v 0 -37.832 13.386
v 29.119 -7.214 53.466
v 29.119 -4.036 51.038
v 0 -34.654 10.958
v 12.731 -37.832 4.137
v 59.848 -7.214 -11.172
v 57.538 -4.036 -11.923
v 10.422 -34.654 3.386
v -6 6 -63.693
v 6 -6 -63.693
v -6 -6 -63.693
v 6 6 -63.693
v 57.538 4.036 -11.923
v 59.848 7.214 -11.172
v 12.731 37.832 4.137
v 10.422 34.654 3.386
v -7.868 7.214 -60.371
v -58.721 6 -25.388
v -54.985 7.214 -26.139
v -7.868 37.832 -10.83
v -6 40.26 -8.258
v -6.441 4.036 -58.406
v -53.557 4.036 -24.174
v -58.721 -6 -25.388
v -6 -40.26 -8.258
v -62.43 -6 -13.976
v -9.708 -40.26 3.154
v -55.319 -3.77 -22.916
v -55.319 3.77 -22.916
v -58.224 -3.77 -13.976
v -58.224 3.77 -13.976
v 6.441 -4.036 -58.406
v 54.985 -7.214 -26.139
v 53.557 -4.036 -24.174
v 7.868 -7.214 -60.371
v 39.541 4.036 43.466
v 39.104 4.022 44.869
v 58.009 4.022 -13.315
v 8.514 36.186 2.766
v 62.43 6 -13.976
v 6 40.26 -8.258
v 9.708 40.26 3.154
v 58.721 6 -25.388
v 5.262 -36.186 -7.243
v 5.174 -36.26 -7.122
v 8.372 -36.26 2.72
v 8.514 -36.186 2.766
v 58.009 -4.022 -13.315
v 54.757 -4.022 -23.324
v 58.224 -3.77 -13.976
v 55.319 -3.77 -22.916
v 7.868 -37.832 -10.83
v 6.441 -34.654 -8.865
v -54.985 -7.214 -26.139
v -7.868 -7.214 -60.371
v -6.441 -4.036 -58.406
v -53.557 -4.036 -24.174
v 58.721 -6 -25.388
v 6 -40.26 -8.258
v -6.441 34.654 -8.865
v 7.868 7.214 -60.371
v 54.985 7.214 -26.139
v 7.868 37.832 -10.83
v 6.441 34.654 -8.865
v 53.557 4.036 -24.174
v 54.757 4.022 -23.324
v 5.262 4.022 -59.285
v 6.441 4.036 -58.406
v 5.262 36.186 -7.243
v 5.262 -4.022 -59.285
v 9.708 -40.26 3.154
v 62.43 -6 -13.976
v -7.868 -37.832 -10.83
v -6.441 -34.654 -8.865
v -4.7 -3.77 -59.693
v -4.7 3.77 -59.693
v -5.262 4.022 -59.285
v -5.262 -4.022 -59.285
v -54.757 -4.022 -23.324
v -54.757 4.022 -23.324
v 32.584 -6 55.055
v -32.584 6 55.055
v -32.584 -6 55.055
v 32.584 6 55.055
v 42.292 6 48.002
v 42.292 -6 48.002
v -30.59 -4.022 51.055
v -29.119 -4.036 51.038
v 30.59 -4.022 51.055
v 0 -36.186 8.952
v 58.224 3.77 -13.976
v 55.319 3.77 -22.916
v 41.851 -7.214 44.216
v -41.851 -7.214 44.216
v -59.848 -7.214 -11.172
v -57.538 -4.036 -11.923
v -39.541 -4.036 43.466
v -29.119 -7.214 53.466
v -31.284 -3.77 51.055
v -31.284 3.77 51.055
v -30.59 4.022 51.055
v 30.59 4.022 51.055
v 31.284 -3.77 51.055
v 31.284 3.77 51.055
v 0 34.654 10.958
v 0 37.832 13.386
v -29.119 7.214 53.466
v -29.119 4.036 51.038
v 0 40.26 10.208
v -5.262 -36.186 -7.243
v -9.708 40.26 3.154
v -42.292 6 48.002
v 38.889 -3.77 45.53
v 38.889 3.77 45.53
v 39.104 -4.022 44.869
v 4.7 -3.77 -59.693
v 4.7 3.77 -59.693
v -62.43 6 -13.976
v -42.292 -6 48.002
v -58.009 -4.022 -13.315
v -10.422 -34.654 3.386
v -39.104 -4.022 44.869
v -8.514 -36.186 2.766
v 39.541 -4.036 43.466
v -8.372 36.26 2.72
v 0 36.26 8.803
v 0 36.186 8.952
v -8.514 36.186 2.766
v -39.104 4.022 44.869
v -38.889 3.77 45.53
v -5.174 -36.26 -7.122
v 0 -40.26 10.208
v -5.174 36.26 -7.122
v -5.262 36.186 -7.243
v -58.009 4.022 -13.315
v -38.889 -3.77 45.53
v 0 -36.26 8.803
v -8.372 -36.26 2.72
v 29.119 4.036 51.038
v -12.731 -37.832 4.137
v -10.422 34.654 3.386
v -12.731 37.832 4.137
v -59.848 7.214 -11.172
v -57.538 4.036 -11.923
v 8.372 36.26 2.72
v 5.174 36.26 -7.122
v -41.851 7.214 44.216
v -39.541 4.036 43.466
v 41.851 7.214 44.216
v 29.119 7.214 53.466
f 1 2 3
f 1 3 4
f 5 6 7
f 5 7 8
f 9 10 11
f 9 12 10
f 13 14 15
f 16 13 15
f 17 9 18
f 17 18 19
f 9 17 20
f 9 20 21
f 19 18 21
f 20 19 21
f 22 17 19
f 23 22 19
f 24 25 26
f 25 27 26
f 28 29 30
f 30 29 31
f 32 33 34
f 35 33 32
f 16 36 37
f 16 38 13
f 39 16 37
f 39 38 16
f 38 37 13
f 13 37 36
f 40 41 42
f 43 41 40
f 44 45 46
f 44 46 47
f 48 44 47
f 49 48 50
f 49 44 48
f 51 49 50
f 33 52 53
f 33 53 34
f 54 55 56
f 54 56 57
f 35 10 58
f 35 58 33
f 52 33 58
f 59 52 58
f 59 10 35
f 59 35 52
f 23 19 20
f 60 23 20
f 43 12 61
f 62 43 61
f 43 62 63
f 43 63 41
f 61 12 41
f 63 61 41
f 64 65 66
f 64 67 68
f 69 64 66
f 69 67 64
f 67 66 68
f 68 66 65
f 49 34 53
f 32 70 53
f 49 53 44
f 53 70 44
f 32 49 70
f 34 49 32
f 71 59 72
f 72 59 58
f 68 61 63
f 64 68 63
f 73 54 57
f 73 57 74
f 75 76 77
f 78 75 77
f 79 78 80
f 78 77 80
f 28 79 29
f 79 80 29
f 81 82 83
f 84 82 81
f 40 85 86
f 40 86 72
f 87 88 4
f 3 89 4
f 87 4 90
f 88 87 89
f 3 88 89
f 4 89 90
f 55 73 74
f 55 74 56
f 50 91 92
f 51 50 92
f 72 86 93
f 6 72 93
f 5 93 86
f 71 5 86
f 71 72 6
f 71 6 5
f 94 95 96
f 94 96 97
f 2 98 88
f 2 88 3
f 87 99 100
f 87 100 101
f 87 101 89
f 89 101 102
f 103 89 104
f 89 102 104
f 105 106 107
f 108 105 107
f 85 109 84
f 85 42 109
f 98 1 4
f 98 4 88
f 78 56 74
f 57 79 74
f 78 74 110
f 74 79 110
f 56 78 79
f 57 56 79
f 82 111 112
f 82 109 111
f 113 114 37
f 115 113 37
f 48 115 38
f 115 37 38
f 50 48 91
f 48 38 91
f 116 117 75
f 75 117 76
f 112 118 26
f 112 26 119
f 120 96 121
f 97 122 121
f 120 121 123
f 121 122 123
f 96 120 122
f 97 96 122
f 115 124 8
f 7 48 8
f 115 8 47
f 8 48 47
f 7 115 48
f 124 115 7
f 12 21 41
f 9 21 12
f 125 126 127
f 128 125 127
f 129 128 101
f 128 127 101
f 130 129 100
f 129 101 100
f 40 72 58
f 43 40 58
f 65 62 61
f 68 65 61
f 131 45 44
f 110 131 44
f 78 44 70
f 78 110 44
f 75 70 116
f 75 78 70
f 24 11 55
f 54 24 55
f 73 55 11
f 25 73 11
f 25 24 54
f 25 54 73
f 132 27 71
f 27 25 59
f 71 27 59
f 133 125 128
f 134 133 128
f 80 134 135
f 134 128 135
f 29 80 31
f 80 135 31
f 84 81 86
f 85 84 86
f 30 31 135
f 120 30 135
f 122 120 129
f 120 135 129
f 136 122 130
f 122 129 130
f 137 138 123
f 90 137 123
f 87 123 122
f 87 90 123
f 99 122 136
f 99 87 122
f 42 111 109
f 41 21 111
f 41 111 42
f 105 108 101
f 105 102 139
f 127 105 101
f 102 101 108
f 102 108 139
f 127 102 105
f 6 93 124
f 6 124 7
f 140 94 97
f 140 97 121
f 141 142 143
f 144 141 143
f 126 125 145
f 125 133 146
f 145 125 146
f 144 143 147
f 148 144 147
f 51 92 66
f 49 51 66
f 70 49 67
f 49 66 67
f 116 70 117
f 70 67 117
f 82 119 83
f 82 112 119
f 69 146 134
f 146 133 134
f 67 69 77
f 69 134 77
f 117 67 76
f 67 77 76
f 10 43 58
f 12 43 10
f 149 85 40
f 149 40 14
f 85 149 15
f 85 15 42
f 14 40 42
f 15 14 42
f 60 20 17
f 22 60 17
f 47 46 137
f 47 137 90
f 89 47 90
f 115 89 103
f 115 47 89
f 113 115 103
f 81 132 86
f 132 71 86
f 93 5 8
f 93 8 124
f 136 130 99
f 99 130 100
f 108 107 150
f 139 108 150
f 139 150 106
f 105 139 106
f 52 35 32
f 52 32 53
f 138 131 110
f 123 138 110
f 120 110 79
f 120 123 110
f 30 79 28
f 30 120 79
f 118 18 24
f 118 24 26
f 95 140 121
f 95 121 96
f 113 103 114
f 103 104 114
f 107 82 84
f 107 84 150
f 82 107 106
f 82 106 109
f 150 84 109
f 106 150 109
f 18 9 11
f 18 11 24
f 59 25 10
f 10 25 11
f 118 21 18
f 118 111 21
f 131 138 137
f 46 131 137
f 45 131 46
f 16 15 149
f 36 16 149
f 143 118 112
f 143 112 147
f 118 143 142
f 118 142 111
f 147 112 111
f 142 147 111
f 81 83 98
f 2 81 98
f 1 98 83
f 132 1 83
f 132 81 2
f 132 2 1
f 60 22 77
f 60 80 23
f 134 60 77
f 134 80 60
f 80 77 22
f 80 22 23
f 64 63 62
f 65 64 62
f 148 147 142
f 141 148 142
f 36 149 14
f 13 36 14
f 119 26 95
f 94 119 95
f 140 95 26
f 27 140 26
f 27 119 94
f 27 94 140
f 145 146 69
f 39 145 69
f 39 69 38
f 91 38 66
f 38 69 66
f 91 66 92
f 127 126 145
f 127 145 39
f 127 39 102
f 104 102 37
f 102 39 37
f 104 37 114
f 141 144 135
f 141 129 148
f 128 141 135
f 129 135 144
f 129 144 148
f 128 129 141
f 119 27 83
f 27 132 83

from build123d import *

# Parameters (mm, degrees)
EXTRUDE_1_DEPTH          = 6
EXTRUDE_2_DEPTH          = 50
EXTRUDE_3_REACH          = 116.36
EXTRUDE_4_REACH          = 109.318
PATTERN_CIRCULAR_1_COUNT = 5
CUT_EXTRUDE_START        = 34.260416
CUT_EXTRUDE_2_DEPTH      = 15.739584
SHELL_2_T                = 4
CUT_EXTRUDE_3_DEPTH      = 4
PATTERN_CIRCULAR_2_COUNT = 5
MIRROR_2_COPY_1_DEPTH    = 4
MIRROR_2_COPY_2_DEPTH    = 4
MIRROR_2_COPY_3_DEPTH    = 4
MIRROR_2_COPY_4_DEPTH    = 4


with BuildPart() as part:
    # 草图1 → 凸台-拉伸1 (new body)
    with BuildSketch(Plane(origin=(0, 0, 0), x_dir=(1, 0, 0), z_dir=(0, 1, 0))):
        Polygon((6, 63.6928095), (-6, 63.6928095), (-58.72135955, 25.388499653), (-62.429563482, 13.975821457), (-42.291796068, -48.001853791), (-32.583592135, -55.055276819), (32.583592135, -55.055276819), (42.291796068, -48.001853791), (62.429563482, 13.975821457), (58.72135955, 25.388499653), align=None)
    extrude(amount=EXTRUDE_1_DEPTH)

    # 草图2 → 凸台-拉伸2 (add)
    with BuildSketch(Plane(origin=(0, 6, 0), x_dir=(1, 0, 0), z_dir=(0, 1, 0))):
        Polygon((-6, 8.258291523), (-9.708203932, -3.154386673), (0, -10.2078097), (9.708203932, -3.154386673), (6, 8.258291523), align=None)
    extrude(amount=EXTRUDE_2_DEPTH)

    # 草图3 → 凸台-拉伸3 (add, up to next)
    with BuildSketch(Plane(origin=(22.048945114, 30.347769421, 7.164136549), x_dir=(-0.8164965809277247, 0.5619055660577269, 0.1326479105251229), z_dir=(-0.5773502691896276, -0.7946544722917646, -0.18759247408508062)), mode=Mode.PRIVATE) as extrude_3_sk1:
        Polygon((-49.45595525, 14.980471634), (-24.792327887, -45.339238172), (15.114259472, 6.179944577), align=None)
    extrude_3_tool1 = extrude(extrude_3_sk1.sketch, amount=EXTRUDE_3_REACH, mode=Mode.PRIVATE) - part.part
    extrude_3 = extrude_3_tool1.solids().sort_by_distance((38.143188, 17.420139, 12.393473))[0]
    add(extrude_3)

    # 草图5 → 凸台-拉伸4 (add, up to next)
    with BuildSketch(Plane(origin=(19.294598211, 32.825931131, -6.26919499), x_dir=(0.8660254037844378, -0.49112347318842436, 0.09379623704254153), z_dir=(0.5000000000000017, 0.8506508083520388, -0.16245984811645525)), mode=Mode.PRIVATE) as extrude_4_sk1:
        Polygon((-11.069414635, -10.650937771), (49.807967622, 12.602153105), (45.526102544, 23.812221413), (-15.351279712, 0.559130537), align=None)
    extrude_4_tool1 = extrude(extrude_4_sk1.sketch, amount=-EXTRUDE_4_REACH, mode=Mode.PRIVATE) - part.part
    extrude_4 = extrude_4_tool1.solids().sort_by_distance((34.214782, 23.130208, -11.117056))[0]
    add(extrude_4)

    # 阵列(圆周)1: 凸台-拉伸3, 凸台-拉伸4 ×5 about axis
    pattern_circular_1_axis = Axis((0, 0, 0), (0, 1, 0))
    add([extrude_3.rotate(pattern_circular_1_axis, i * 360 / PATTERN_CIRCULAR_1_COUNT) for i in range(1, PATTERN_CIRCULAR_1_COUNT)])
    add([extrude_4.rotate(pattern_circular_1_axis, i * 360 / PATTERN_CIRCULAR_1_COUNT) for i in range(1, PATTERN_CIRCULAR_1_COUNT)])

    # 草图2<2> → 切除-拉伸2 (cut)
    with BuildSketch(Plane(origin=(0, 6, 0), x_dir=(1, 0, 0), z_dir=(0, 1, 0)).offset(CUT_EXTRUDE_START)):
        Polygon((-6, 8.258291523), (-9.708203932, -3.154386673), (0, -10.2078097), (9.708203932, -3.154386673), (6, 8.258291523), align=None)
    extrude(amount=CUT_EXTRUDE_2_DEPTH, mode=Mode.SUBTRACT)

    # 镜向1: part across plane


with BuildPart() as part_1:
    add(part.part)
    add(part.part.mirror(Plane.ZX))

    # 抽壳2 (no face opened: a closed hollow body)
    add(offset(amount=-SHELL_2_T, mode=Mode.PRIVATE), mode=Mode.SUBTRACT)

    # 草图6 → 切除-拉伸3 (cut)
    with BuildSketch(Plane(origin=(22.048945114, 30.347769421, 7.164136549), x_dir=(0.8164965809277248, -0.5619055660577268, -0.13264791052512276), z_dir=(0.5773502691896275, 0.7946544722917647, 0.18759247408508056))):
        Polygon((-11.411800298, 4.66607666), (24.252146374, -41.375880513), (46.29367759, 12.530981891), align=None)
    cut_extrude_3 = extrude(amount=-CUT_EXTRUDE_3_DEPTH, mode=Mode.SUBTRACT)

    # 阵列(圆周)2: 切除-拉伸3 ×5 about axis
    pattern_circular_2_axis = Axis((0, 0, 0), (0, 1, 0))
    for i in range(1, PATTERN_CIRCULAR_2_COUNT):
        add(cut_extrude_3.rotate(pattern_circular_2_axis, i * 360 / PATTERN_CIRCULAR_2_COUNT), mode=Mode.SUBTRACT)

    # 镜向2: 切除-拉伸3 across plane
    add(cut_extrude_3.mirror(Plane.ZX), mode=Mode.SUBTRACT)

    # 镜向2 copy 1 sketch → 镜向2 copy 1 (cut)
    with BuildSketch(Plane(origin=(13.626997497, -30.347769421, -18.755952985), x_dir=(0.12615565967785208, 0.5619055660577268, -0.8175248524446163), z_dir=(0.3568220897730911, -0.7946544722917647, -0.4911234731884244))):
        Polygon((-11.411800298, -4.66607666), (24.252146374, 41.375880513), (46.29367759, -12.530981891), align=None)
    extrude(amount=-MIRROR_2_COPY_1_DEPTH, mode=Mode.SUBTRACT)

    # 镜向2 copy 2 sketch → 镜向2 copy 2 (cut)
    with BuildSketch(Plane(origin=(-13.626997497, -30.347769421, -18.755952985), x_dir=(-0.7385280953736475, 0.5619055660577268, -0.37261023493339274), z_dir=(-0.3568220897730909, -0.7946544722917647, -0.49112347318842464))):
        Polygon((-11.411800298, -4.66607666), (24.252146374, 41.375880513), (46.29367759, -12.530981891), align=None)
    extrude(amount=-MIRROR_2_COPY_2_DEPTH, mode=Mode.SUBTRACT)

    # 镜向2 copy 3 sketch → 镜向2 copy 3 (cut)
    with BuildSketch(Plane(origin=(-22.048945114, -30.347769421, 7.164136549), x_dir=(-0.5825911242654904, 0.5619055660577267, 0.5872390626996962), z_dir=(-0.5773502691896276, -0.7946544722917646, 0.18759247408508029))):
        Polygon((-11.411800298, -4.66607666), (24.252146374, 41.375880513), (46.29367759, -12.530981891), align=None)
    extrude(amount=-MIRROR_2_COPY_3_DEPTH, mode=Mode.SUBTRACT)

    # 镜向2 copy 4 sketch → 镜向2 copy 4 (cut)
    with BuildSketch(Plane(origin=(0, -30.347769421, 23.183632872), x_dir=(0.37846697903356086, 0.5619055660577268, 0.7355439352034356), z_dir=(0, -0.7946544722917647, 0.6070619982066882))):
        Polygon((-11.411800298, -4.66607666), (24.252146374, 41.375880513), (46.29367759, -12.530981891), align=None)
    extrude(amount=-MIRROR_2_COPY_4_DEPTH, mode=Mode.SUBTRACT)


solid = part_1.part
